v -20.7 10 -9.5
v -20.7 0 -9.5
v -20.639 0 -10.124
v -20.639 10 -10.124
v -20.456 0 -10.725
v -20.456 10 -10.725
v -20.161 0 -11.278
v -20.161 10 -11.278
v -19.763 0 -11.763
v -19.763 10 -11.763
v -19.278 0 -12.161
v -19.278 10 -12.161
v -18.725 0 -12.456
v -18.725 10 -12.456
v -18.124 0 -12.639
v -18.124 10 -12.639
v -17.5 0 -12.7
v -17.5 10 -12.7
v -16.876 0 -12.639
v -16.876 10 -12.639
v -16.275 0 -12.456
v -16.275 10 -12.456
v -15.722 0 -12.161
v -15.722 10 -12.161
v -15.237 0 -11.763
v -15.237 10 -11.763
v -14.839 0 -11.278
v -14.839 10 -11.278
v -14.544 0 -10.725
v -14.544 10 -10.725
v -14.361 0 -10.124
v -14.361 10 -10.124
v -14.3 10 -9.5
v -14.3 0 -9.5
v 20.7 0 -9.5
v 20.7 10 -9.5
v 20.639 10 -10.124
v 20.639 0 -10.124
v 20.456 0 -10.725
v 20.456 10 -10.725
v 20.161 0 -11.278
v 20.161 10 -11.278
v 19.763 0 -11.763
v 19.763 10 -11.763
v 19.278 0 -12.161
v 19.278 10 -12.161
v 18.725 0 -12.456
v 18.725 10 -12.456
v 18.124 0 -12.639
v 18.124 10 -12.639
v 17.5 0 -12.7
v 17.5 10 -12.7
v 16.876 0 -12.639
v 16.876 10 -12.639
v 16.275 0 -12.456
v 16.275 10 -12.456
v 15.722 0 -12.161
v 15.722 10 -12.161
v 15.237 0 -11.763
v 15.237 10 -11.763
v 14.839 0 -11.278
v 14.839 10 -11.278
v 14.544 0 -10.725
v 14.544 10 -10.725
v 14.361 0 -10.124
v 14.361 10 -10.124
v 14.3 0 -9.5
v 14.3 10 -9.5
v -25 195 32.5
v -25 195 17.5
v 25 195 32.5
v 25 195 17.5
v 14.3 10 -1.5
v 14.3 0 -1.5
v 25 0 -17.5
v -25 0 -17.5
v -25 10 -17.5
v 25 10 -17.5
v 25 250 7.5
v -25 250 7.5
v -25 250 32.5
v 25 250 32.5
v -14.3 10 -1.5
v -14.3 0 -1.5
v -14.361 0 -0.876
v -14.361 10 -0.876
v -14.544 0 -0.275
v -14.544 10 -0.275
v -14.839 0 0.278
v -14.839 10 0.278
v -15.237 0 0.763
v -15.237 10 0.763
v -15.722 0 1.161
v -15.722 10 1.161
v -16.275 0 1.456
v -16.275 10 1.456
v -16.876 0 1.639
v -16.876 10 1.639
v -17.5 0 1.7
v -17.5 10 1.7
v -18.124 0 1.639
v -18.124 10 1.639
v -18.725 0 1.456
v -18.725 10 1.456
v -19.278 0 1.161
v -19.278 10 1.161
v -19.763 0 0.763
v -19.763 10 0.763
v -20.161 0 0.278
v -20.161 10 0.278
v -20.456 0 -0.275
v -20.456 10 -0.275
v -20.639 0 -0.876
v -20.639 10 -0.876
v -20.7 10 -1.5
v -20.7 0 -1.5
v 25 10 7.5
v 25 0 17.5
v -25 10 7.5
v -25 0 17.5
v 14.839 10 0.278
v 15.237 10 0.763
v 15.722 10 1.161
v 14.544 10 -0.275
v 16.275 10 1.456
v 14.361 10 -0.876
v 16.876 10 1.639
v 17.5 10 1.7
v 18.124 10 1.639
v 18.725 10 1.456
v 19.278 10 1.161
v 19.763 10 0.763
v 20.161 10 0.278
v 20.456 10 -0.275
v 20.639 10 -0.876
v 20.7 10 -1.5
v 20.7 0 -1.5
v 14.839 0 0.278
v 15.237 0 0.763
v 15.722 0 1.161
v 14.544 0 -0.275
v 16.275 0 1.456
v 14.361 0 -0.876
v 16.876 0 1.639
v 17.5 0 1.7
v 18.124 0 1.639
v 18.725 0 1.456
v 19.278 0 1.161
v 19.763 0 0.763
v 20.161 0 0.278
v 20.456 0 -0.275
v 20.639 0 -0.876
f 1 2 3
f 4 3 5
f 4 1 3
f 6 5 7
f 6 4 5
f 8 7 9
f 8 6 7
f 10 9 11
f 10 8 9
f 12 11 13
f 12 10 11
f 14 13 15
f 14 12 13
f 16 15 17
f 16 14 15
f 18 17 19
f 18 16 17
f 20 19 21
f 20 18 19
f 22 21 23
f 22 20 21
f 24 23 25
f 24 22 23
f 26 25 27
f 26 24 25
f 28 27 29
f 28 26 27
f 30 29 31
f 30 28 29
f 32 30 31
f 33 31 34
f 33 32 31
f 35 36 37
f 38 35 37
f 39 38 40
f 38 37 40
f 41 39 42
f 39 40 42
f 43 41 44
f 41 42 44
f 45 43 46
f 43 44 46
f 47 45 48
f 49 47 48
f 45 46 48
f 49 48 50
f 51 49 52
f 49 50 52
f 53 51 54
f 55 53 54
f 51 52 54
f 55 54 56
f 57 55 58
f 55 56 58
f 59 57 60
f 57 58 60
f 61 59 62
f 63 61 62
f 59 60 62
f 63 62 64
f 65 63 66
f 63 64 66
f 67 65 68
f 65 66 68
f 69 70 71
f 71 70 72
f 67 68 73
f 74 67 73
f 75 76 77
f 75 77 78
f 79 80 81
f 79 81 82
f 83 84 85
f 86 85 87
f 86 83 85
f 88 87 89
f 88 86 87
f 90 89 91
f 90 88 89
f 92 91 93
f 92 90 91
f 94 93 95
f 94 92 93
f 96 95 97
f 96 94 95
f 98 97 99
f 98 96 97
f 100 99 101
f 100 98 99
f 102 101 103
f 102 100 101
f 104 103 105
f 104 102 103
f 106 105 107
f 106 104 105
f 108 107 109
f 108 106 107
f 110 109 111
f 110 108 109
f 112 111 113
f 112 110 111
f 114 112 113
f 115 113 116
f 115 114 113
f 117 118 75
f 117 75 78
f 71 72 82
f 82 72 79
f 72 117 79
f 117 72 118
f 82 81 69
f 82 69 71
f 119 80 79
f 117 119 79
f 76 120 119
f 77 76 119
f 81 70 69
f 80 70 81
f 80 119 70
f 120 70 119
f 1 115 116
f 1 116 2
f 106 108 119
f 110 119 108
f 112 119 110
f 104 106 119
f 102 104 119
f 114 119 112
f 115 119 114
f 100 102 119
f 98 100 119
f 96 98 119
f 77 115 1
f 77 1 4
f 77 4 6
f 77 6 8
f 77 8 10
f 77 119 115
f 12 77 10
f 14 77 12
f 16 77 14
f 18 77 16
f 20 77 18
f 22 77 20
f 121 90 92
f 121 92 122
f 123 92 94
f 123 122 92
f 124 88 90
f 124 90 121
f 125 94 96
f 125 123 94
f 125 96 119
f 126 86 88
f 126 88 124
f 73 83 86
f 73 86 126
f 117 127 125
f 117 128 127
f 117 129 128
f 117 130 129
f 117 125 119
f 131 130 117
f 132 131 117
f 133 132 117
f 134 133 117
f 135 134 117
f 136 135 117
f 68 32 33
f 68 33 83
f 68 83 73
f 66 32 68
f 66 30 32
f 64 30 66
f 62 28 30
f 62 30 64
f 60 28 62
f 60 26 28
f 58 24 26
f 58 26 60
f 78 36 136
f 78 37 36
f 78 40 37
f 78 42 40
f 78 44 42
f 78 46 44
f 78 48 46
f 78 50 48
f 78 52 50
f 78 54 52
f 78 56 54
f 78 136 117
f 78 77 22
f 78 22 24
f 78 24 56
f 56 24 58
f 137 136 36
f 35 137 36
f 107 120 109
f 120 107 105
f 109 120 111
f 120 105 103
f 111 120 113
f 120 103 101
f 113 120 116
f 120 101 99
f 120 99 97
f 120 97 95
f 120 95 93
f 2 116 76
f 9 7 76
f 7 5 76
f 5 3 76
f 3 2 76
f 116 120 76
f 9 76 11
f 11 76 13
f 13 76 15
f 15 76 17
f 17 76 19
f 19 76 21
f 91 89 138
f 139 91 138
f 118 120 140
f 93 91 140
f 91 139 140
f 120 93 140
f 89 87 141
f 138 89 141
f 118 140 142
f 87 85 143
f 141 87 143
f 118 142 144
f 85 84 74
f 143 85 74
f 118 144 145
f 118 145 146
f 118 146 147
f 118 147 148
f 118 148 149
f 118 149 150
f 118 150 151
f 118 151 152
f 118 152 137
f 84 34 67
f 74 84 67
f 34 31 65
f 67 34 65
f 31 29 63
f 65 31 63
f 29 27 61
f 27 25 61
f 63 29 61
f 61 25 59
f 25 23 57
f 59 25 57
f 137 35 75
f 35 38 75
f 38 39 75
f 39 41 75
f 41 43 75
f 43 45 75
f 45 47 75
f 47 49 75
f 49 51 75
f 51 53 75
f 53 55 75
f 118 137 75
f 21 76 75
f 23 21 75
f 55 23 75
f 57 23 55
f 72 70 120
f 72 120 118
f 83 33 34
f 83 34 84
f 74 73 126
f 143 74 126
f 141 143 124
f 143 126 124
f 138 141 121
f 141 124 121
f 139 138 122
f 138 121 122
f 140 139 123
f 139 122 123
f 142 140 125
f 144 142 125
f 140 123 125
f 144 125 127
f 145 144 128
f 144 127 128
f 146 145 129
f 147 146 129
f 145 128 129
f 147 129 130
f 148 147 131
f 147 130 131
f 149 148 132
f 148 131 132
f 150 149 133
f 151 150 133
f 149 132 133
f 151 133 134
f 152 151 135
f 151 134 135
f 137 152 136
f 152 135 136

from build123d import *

# Parameters (mm, degrees)
SKETCH_1_W          = 50
SKETCH_1_H          = 35
EXTRUDE_1_DEPTH     = 250
SKETCH_2_W          = 50
SKETCH_2_H          = 25
CUT_EXTRUDE_1_DEPTH = 240
CUT_EXTRUDE_2_DEPTH = 11
SKETCH_5_W          = 50
SKETCH_5_H          = 55
EXTRUDE_2_DEPTH     = 15


with BuildPart() as part:
    # 草图1 → 凸台-拉伸1 (new body)
    with BuildSketch(Plane(origin=(0, 0, 0), x_dir=(1, 0, 0), z_dir=(0, 1, 0))):
        Rectangle(SKETCH_1_W, SKETCH_1_H)
    extrude(amount=EXTRUDE_1_DEPTH)

    # 草图2 → 切除-拉伸1 (cut)
    with BuildSketch(Plane(origin=(0, 250, 0), x_dir=(1, 0, 0), z_dir=(0, 1, 0))):
        with Locations((0, 5)):
            Rectangle(SKETCH_2_W, SKETCH_2_H)
    extrude(amount=-CUT_EXTRUDE_1_DEPTH, mode=Mode.SUBTRACT)

    # 草图3 → 切除-拉伸2 (cut, through all)
    with BuildSketch(Plane(origin=(0, 10, 0), x_dir=(1, 0, 0), z_dir=(0, 1, 0))):
        with BuildLine():
            Line((-20.7, 1.5), (-20.7, 9.5))
            ThreePointArc((-20.7, 9.5), (-17.5, 12.7), (-14.3, 9.5))
            Line((-14.3, 9.5), (-14.3, 1.5))
            ThreePointArc((-14.3, 1.5), (-17.5, -1.7), (-20.7, 1.5))
        make_face()
        with BuildLine():
            Line((20.7, 1.5), (20.7, 9.5))
            ThreePointArc((20.7, 9.5), (17.5, 12.7), (14.3, 9.5))
            Line((14.3, 9.5), (14.3, 1.5))
            ThreePointArc((14.3, 1.5), (17.5, -1.7), (20.7, 1.5))
        make_face()
    extrude(amount=-CUT_EXTRUDE_2_DEPTH, mode=Mode.SUBTRACT)

    # 草图5 → 凸台-拉伸2 (add)
    with BuildSketch(Plane.XY.offset(17.5)):
        with Locations((0, 222.5)):
            Rectangle(SKETCH_5_W, SKETCH_5_H)
    extrude(amount=EXTRUDE_2_DEPTH)


solid = part.part
